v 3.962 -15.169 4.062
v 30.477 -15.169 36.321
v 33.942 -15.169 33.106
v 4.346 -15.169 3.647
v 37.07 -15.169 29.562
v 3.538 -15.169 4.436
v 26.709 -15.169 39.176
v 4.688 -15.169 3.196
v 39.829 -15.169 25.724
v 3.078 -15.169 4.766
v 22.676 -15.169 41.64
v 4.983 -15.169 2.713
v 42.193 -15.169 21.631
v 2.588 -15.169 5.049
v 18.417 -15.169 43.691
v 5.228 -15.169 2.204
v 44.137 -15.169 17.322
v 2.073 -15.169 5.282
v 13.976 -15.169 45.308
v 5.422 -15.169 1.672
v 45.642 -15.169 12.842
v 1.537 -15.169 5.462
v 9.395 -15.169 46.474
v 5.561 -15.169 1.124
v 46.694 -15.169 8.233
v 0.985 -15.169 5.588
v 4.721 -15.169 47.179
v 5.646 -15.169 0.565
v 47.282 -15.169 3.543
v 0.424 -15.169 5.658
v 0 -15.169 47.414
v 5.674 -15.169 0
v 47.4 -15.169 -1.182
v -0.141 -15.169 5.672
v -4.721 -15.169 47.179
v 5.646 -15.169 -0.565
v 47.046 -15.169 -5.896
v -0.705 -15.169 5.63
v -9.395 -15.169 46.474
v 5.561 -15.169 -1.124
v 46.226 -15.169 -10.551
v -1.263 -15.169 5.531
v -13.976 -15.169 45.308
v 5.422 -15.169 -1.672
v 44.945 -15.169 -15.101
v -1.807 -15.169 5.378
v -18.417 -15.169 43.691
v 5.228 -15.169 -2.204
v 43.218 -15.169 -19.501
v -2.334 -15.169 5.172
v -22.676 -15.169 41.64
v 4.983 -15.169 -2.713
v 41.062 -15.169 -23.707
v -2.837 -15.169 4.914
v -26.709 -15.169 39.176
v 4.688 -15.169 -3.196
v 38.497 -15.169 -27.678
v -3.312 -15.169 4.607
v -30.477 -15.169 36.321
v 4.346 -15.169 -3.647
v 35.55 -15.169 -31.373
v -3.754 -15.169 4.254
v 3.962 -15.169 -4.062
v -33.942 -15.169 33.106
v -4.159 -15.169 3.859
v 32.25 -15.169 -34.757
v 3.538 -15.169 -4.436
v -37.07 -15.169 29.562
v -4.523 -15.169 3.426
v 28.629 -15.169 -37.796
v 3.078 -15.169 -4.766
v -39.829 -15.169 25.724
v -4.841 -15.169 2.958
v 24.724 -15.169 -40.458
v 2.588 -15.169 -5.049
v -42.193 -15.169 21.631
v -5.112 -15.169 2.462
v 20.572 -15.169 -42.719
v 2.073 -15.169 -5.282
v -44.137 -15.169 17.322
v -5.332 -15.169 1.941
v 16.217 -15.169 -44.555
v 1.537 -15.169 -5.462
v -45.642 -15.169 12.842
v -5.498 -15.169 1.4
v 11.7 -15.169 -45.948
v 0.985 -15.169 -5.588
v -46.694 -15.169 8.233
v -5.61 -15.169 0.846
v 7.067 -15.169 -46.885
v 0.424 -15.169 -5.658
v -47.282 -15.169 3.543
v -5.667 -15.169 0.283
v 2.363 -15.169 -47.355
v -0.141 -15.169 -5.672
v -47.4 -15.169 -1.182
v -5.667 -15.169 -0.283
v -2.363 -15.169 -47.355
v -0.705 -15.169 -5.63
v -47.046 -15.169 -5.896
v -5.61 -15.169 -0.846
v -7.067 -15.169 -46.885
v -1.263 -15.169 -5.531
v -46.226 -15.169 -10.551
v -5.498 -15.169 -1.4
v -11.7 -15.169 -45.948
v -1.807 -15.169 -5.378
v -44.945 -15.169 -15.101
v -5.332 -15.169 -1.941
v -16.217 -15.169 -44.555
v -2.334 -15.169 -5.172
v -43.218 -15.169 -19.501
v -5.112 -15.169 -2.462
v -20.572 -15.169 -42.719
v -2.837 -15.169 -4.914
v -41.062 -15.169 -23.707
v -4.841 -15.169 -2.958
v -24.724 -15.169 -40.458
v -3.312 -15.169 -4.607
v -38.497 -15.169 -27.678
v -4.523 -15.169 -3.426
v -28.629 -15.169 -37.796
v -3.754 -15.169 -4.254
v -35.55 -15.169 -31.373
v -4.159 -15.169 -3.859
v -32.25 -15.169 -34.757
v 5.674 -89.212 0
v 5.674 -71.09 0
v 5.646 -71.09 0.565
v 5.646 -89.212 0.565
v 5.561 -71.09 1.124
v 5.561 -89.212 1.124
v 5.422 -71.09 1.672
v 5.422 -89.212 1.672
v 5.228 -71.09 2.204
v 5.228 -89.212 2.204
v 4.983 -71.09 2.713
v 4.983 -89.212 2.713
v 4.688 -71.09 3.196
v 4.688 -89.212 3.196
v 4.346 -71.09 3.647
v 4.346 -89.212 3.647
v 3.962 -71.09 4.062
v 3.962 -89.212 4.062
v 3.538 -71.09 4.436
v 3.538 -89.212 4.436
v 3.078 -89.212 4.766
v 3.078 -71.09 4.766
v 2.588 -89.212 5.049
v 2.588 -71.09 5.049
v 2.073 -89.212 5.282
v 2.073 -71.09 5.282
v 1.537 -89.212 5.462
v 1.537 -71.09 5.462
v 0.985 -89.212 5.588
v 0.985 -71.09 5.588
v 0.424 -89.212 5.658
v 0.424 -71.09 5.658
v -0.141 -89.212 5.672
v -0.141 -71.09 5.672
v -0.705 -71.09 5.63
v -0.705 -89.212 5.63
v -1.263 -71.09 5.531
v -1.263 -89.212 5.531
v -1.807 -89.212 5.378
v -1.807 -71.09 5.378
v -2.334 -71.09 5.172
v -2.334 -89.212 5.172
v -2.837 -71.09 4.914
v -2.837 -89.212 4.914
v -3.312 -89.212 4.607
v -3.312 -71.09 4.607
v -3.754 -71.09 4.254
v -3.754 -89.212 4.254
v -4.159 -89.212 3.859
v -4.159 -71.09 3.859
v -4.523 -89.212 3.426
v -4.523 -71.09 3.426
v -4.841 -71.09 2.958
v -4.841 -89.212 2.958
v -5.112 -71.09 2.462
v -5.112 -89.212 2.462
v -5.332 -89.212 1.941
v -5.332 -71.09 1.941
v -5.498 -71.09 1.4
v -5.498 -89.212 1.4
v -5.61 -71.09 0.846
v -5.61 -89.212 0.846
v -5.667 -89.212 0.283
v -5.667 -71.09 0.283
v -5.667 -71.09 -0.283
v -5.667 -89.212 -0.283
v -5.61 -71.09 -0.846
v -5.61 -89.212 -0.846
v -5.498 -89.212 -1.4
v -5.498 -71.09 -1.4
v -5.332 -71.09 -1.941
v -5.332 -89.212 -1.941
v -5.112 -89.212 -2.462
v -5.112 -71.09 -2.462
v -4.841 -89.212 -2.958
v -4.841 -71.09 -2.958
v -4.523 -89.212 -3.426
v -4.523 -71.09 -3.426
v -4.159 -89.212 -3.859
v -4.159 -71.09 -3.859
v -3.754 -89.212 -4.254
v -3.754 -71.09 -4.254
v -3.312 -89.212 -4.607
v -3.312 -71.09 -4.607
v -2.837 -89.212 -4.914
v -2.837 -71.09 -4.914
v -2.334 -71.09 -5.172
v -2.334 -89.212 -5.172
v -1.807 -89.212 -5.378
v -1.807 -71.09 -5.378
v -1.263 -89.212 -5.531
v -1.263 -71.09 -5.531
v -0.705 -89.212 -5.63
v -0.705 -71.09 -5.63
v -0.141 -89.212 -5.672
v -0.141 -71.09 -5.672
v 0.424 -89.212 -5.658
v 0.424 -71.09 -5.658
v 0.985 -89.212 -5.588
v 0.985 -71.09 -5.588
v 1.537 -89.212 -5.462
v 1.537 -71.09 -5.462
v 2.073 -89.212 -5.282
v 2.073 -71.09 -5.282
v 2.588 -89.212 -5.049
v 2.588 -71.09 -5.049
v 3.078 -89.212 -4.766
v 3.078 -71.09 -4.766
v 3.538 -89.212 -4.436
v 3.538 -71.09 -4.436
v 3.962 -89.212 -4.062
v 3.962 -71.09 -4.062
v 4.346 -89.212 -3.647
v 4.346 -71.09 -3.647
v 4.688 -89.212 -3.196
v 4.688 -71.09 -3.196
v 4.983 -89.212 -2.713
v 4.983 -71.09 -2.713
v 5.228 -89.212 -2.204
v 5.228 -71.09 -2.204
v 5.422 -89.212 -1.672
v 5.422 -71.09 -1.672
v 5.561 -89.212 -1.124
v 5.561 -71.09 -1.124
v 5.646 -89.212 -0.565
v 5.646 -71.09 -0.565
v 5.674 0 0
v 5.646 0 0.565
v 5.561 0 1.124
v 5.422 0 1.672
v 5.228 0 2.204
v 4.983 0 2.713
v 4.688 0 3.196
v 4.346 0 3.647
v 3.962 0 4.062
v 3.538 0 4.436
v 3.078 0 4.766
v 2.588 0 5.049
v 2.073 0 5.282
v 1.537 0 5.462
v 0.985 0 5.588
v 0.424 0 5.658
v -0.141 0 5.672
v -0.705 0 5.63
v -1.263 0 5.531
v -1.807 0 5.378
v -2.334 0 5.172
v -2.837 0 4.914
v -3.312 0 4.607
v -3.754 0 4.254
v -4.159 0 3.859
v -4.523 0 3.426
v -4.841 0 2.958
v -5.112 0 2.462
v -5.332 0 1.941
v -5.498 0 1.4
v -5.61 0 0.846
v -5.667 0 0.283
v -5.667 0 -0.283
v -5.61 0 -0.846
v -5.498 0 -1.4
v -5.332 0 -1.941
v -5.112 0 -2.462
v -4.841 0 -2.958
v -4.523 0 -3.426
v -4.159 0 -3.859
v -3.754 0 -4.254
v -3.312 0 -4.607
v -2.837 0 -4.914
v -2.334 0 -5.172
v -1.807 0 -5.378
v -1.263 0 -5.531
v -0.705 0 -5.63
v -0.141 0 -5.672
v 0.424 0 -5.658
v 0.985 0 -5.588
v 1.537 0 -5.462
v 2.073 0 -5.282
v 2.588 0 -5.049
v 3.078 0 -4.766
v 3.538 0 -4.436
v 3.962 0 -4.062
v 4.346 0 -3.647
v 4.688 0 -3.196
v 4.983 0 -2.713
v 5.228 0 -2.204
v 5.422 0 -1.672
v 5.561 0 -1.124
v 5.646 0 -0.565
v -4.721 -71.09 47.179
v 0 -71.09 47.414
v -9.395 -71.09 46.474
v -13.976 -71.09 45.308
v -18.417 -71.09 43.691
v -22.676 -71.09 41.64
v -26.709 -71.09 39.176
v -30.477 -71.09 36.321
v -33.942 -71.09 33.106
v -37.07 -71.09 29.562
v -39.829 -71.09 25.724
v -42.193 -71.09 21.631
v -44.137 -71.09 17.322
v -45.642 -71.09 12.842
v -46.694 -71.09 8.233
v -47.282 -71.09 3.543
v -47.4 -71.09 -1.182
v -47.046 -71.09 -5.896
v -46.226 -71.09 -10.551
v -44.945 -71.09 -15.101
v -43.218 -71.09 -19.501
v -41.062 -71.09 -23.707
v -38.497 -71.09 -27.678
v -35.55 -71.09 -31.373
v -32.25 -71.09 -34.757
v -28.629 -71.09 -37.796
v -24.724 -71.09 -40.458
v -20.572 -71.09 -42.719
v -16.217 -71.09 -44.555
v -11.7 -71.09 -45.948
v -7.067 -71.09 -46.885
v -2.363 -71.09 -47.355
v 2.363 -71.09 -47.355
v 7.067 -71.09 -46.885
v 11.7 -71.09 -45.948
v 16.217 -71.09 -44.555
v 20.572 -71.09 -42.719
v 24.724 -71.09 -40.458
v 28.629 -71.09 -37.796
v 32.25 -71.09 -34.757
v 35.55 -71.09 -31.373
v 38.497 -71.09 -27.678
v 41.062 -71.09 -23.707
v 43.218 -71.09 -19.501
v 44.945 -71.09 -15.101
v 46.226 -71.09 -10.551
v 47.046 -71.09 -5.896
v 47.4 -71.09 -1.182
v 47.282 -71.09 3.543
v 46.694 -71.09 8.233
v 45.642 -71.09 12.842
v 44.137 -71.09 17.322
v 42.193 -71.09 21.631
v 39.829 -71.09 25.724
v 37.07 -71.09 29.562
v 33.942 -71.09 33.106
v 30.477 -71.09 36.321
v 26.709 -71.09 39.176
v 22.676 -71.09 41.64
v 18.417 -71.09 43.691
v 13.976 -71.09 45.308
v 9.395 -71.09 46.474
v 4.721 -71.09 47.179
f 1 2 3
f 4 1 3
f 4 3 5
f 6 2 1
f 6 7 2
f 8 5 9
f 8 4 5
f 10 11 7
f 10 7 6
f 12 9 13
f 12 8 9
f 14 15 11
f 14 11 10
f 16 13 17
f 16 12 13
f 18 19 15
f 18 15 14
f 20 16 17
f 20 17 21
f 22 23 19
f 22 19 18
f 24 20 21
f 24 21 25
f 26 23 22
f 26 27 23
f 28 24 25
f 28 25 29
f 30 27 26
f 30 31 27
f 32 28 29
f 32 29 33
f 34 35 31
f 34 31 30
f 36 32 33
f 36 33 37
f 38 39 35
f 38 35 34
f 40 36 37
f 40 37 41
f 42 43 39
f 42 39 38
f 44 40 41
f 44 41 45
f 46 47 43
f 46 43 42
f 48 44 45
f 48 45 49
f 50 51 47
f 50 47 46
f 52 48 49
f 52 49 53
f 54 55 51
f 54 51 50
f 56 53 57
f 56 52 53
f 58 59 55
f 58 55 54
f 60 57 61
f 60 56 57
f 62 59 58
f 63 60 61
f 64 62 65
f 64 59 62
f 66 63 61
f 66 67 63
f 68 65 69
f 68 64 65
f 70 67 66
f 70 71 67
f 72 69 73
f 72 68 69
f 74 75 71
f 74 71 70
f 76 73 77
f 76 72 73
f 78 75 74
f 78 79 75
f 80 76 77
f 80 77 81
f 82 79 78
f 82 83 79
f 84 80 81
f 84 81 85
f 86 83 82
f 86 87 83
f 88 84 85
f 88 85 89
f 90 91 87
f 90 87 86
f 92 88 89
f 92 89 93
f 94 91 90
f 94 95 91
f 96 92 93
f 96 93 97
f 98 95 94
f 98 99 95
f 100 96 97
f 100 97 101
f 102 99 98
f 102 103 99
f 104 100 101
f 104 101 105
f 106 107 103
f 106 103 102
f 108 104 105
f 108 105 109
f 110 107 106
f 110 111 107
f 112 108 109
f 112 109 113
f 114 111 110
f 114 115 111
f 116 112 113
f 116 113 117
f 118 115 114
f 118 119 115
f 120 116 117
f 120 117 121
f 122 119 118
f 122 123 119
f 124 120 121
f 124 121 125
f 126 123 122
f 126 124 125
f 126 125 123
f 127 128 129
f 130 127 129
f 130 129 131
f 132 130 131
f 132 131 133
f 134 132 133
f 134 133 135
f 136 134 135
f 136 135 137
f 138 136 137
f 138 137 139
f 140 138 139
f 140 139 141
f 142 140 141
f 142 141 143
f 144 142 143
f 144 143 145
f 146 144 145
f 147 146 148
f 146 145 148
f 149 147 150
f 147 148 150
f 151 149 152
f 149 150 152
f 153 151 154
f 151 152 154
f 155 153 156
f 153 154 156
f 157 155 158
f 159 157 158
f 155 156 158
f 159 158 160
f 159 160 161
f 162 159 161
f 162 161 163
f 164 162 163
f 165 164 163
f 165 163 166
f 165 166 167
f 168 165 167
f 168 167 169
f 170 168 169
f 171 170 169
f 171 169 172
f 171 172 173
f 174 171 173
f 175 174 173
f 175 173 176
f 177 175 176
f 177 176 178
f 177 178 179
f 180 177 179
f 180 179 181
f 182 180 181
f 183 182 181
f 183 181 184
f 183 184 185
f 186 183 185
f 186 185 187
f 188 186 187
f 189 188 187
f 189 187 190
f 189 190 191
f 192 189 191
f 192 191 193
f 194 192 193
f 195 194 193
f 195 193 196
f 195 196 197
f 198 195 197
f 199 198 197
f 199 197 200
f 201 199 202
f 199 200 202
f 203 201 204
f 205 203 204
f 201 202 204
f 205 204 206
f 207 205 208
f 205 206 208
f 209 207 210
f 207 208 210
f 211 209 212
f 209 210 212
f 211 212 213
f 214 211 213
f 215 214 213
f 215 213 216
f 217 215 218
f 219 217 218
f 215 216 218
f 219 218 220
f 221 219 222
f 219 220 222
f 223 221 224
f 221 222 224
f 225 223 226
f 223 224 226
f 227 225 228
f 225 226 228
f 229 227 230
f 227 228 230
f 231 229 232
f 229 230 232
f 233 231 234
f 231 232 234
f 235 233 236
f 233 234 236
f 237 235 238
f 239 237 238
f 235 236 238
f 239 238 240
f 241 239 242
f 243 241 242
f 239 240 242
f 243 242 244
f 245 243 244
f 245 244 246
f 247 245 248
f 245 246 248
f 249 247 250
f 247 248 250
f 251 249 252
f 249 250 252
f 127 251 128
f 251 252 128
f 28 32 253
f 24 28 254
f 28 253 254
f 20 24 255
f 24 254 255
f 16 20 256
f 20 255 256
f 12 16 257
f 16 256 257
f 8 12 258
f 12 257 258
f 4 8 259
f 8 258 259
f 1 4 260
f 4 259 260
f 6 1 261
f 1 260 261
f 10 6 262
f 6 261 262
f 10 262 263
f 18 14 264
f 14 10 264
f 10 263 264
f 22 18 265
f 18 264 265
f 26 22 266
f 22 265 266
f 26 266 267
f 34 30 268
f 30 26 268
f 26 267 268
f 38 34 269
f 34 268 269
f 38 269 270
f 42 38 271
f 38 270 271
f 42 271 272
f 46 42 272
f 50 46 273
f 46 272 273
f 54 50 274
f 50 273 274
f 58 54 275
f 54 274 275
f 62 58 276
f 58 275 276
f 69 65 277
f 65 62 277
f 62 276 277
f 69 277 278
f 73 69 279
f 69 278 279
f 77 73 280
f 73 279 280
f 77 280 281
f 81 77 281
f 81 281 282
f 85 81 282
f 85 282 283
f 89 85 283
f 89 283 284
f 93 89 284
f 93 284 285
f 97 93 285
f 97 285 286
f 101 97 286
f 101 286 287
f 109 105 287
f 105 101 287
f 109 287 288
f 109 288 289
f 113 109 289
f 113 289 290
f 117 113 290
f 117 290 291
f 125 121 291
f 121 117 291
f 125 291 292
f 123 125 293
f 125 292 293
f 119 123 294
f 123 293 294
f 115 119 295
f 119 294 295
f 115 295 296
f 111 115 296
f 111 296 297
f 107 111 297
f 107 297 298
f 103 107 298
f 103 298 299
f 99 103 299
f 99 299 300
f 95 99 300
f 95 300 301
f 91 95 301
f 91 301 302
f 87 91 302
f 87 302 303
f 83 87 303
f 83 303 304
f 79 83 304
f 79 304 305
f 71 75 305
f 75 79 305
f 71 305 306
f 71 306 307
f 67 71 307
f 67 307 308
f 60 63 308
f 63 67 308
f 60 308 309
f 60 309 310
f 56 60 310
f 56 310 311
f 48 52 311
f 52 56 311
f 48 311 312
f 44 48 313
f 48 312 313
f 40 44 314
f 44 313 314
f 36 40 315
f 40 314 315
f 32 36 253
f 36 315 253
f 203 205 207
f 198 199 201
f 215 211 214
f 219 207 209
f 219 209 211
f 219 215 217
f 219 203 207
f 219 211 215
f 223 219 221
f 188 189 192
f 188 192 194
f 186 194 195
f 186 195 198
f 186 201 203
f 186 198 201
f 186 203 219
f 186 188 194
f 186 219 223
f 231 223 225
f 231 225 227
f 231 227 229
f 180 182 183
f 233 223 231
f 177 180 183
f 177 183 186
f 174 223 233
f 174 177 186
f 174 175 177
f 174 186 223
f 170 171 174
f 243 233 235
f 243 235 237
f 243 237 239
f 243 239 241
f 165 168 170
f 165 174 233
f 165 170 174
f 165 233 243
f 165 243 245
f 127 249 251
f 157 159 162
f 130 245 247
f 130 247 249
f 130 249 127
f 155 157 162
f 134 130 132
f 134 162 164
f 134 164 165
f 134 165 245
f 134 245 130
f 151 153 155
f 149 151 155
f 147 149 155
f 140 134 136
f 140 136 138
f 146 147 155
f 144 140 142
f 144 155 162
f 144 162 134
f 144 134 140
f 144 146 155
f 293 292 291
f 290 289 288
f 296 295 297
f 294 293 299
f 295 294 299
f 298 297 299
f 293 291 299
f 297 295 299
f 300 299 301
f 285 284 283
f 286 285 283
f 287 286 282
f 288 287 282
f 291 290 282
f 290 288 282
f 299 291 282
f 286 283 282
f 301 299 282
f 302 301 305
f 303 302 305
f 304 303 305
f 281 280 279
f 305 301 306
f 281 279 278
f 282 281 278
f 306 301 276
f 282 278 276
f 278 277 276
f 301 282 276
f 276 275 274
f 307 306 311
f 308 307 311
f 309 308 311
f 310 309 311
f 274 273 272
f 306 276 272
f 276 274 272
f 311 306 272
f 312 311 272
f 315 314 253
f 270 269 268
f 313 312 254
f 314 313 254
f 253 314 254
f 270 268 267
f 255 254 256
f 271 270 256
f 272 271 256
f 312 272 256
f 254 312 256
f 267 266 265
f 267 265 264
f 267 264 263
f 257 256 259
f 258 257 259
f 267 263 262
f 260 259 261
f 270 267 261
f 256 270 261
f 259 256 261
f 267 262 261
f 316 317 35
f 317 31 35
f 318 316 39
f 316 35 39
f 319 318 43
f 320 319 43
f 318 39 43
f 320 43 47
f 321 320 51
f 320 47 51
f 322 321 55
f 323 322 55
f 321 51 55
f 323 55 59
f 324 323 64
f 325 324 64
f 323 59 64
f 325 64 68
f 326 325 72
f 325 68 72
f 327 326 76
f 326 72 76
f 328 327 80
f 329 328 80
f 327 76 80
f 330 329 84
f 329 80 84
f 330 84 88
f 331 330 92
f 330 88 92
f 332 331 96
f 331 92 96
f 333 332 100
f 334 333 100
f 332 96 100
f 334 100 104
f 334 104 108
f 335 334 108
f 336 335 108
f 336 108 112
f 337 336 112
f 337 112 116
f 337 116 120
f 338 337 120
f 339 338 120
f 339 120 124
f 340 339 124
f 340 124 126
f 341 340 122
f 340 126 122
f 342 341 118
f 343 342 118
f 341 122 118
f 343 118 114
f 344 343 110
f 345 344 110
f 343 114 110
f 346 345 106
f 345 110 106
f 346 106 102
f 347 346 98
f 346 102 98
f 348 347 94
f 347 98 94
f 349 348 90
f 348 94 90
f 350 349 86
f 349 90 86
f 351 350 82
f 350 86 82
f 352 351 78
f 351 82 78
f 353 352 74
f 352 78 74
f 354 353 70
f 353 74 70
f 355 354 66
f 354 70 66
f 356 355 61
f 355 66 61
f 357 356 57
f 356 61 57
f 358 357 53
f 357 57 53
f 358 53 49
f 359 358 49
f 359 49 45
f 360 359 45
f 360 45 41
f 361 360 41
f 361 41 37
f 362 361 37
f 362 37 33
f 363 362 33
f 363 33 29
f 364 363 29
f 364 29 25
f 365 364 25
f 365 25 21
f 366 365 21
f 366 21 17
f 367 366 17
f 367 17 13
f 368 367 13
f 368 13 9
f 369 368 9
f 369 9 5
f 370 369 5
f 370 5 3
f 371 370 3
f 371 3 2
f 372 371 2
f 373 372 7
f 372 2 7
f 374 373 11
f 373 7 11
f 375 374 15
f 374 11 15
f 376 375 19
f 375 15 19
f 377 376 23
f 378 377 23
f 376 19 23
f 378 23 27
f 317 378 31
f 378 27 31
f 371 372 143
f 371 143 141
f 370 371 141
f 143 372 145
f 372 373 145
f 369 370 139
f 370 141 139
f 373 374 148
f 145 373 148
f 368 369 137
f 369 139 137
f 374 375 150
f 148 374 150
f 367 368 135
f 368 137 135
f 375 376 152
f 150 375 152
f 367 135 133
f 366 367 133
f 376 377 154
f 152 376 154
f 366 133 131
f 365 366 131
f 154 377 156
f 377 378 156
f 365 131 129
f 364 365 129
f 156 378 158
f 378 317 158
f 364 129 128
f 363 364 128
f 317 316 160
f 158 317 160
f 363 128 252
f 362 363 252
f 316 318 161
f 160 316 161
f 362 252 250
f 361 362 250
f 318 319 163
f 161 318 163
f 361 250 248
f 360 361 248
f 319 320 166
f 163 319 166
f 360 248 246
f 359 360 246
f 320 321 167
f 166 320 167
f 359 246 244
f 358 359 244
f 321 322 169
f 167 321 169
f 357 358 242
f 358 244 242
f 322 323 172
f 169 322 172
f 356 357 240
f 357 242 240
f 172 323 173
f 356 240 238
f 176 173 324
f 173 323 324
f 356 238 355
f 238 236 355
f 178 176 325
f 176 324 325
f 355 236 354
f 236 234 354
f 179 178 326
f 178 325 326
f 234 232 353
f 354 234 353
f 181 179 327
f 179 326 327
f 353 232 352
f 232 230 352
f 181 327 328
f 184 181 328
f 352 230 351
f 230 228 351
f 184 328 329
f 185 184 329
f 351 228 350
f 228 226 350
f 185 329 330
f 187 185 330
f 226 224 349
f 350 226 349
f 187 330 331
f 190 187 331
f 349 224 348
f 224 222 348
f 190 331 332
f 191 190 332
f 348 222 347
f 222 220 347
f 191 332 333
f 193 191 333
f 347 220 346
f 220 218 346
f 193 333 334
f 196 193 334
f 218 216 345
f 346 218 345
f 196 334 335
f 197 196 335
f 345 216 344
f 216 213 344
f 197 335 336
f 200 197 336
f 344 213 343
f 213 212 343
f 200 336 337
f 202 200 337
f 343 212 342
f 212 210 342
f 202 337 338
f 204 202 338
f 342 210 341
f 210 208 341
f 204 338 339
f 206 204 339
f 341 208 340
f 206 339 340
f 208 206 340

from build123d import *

# Parameters (mm, degrees)
F0_W         = 152.3266881704
F0_H         = 76.2925669551
F1_DEPTH     = 44.45
F2_T         = -2.54
F3_W         = 18.5941308737
F3_H         = 8.1849619746
F4_DEPTH     = 38.1
F5_T         = 2.54
F5_T3_DEPTH  = 13.2649619746
F5_T5_DEPTH  = 23.6741308737
F5_T7_DEPTH  = 78.8325669551
F5_T9_DEPTH  = 44.45
F5_T11_DEPTH = 152.3266881704
F7_R         = 5.6737308036
F8_DEPTH     = 89.211769402
F9_W         = 55.9205748141
F9_H         = 47.4143326283


# Not quite as in the source:
# - a shell that OpenCascade refuses in one call is made with other operations: the cavity is built on its own and cut out


with BuildPart() as f1:
    # F0 (on Front) → F1 (new body)
    with BuildSketch(Plane.XZ):
        with Locations((0.0222995877, 38.1462834775)):
            Rectangle(F0_W, F0_H)
    extrude(amount=F1_DEPTH)

    # F2
    f2_openings = [f1.faces().sort_by_distance(p)[0] for p in [
        (0.0223, -22.225, 0),
    ]]
    offset(amount=F2_T, openings=f2_openings)

    # F3 (on face) → F4 (join)
    with BuildSketch(Plane(origin=(-76.1410444975, 0, 0), x_dir=(0, -1, 0), z_dir=(-1, 0, 0))):
        with Locations((25.1720361412, 52.4518452585)):
            Rectangle(F3_W, F3_H)
    extrude(amount=F4_DEPTH)

    # F5: shell of thickness 2.54, made by hand


with BuildPart() as f5_core1:
    # F5_t2: copy of F1
    add(f1.part)

    # the walls: a layer under each face that stays
    f5_faces = [f5_core1.faces().sort_by_distance(p)[0] for p in [
        (0.0222995877, -22.225, 76.2925669551),
        (76.1856436729, -22.225, 38.1462834775),
        (-76.1410444975, -22.225, 38.1462834775),
        (0.0222995877, 0, 38.1462834775),
        (0.0222995877, -44.45, 38.1462834775),
        (-71.0634882251, -42.9683333333, 0),
        (-95.1910444975, -34.469101578, 52.4518452585),
        (-95.1910444975, -25.1720361412, 48.3593642712),
        (-95.1910444975, -15.8749707043, 52.4518452585),
        (-73.6010444975, -22.225, 36.8762834775),
        (0.0222995877, -2.54, 36.8762834775),
        (73.6456436729, -22.225, 36.8762834775),
        (0.0222995877, -41.91, 36.8762834775),
        (0.0222995877, -22.225, 73.7525669551),
    ]]
    thicken(f5_faces, amount=-F5_T, mode=Mode.SUBTRACT)

    # F5_s4 → F5_t3 (cut)
    with BuildSketch(Plane.XY.offset(45.8193642712)):
        Polygon((-76.1664444975, -34.494501578), (-73.6010444975, -34.469101578), (-73.6010444975, -31.929101578), (-76.1410444975, -31.929101578), align=None)
        Polygon((-76.1664444975, -15.8495707043), (-73.6010444975, -15.8749707043), (-73.6010444975, -18.4149707043), (-76.1410444975, -18.4149707043), align=None)
    extrude(amount=F5_T3_DEPTH, mode=Mode.SUBTRACT)

    # F5_s6 → F5_t5 (cut)
    with BuildSketch(Plane.XZ.offset(13.3349707043)):
        Polygon((-76.1664444975, 48.3339642712), (-73.6010444975, 48.3593642712), (-73.6010444975, 50.8993642712), (-76.1410444975, 50.8993642712), align=None)
    extrude(amount=F5_T5_DEPTH, mode=Mode.SUBTRACT)

    # F5_s8 → F5_t7 (cut)
    with BuildSketch(Plane.XY.offset(-2.54)):
        Polygon((-73.5756444975, -2.5654), (-76.1410444975, -2.54), (-76.1410444975, 0), (-73.6010444975, 0), align=None)
        Polygon((-73.5756444975, -41.8846), (-76.1410444975, -41.91), (-76.1410444975, -44.45), (-73.6010444975, -44.45), align=None)
        Polygon((73.6202436729, -2.5654), (73.6456436729, 0), (76.1856436729, 0), (76.1856436729, -2.54), align=None)
        Polygon((73.6202436729, -41.8846), (76.1856436729, -41.91), (76.1856436729, -44.45), (73.6456436729, -44.45), align=None)
    extrude(amount=F5_T7_DEPTH, mode=Mode.SUBTRACT)

    # F5_s10 → F5_t9 (cut)
    with BuildSketch(Plane.XZ):
        Polygon((-73.5756444975, 73.7271669551), (-76.1410444975, 73.7525669551), (-76.1410444975, 76.2925669551), (-73.6010444975, 76.2925669551), align=None)
        Polygon((73.6202436729, 73.7271669551), (76.1856436729, 73.7525669551), (76.1856436729, 76.2925669551), (73.6456436729, 76.2925669551), align=None)
    extrude(amount=F5_T9_DEPTH, mode=Mode.SUBTRACT)

    # F5_s12 → F5_t11 (cut)
    with BuildSketch(Plane.YZ.offset(-76.1410444975)):
        Polygon((-2.5654, 73.7271669551), (0, 73.7525669551), (0, 76.2925669551), (-2.54, 76.2925669551), align=None)
        Polygon((-41.8846, 73.7271669551), (-44.45, 73.7525669551), (-44.45, 76.2925669551), (-41.91, 76.2925669551), align=None)
    extrude(amount=F5_T11_DEPTH, mode=Mode.SUBTRACT)


with BuildPart() as f1_1:
    add(f1.part)

    # what is left inside the walls is the cavity
    f5_cavity = [f5_core1.part.solids().sort_by_distance(p)[0] for p in [
        (-101.541044, -25.172036, 56.518926),
    ]]
    add(f5_cavity, mode=Mode.SUBTRACT)


with BuildPart() as f8:
    # F7 (on Front) → F8 (new body)
    with BuildSketch(Plane.XZ):
        Circle(F7_R)
    extrude(amount=F8_DEPTH)

    # F9 (on Right) → F10 (revolve)
    with BuildSketch(Plane.YZ):
        with Locations((-43.1295465678, 23.7071663141)):
            Rectangle(F9_W, F9_H)
    revolve(axis=Axis((0, -43.1295465678, 0), (0, -1, 0)))


solid = f8.part
